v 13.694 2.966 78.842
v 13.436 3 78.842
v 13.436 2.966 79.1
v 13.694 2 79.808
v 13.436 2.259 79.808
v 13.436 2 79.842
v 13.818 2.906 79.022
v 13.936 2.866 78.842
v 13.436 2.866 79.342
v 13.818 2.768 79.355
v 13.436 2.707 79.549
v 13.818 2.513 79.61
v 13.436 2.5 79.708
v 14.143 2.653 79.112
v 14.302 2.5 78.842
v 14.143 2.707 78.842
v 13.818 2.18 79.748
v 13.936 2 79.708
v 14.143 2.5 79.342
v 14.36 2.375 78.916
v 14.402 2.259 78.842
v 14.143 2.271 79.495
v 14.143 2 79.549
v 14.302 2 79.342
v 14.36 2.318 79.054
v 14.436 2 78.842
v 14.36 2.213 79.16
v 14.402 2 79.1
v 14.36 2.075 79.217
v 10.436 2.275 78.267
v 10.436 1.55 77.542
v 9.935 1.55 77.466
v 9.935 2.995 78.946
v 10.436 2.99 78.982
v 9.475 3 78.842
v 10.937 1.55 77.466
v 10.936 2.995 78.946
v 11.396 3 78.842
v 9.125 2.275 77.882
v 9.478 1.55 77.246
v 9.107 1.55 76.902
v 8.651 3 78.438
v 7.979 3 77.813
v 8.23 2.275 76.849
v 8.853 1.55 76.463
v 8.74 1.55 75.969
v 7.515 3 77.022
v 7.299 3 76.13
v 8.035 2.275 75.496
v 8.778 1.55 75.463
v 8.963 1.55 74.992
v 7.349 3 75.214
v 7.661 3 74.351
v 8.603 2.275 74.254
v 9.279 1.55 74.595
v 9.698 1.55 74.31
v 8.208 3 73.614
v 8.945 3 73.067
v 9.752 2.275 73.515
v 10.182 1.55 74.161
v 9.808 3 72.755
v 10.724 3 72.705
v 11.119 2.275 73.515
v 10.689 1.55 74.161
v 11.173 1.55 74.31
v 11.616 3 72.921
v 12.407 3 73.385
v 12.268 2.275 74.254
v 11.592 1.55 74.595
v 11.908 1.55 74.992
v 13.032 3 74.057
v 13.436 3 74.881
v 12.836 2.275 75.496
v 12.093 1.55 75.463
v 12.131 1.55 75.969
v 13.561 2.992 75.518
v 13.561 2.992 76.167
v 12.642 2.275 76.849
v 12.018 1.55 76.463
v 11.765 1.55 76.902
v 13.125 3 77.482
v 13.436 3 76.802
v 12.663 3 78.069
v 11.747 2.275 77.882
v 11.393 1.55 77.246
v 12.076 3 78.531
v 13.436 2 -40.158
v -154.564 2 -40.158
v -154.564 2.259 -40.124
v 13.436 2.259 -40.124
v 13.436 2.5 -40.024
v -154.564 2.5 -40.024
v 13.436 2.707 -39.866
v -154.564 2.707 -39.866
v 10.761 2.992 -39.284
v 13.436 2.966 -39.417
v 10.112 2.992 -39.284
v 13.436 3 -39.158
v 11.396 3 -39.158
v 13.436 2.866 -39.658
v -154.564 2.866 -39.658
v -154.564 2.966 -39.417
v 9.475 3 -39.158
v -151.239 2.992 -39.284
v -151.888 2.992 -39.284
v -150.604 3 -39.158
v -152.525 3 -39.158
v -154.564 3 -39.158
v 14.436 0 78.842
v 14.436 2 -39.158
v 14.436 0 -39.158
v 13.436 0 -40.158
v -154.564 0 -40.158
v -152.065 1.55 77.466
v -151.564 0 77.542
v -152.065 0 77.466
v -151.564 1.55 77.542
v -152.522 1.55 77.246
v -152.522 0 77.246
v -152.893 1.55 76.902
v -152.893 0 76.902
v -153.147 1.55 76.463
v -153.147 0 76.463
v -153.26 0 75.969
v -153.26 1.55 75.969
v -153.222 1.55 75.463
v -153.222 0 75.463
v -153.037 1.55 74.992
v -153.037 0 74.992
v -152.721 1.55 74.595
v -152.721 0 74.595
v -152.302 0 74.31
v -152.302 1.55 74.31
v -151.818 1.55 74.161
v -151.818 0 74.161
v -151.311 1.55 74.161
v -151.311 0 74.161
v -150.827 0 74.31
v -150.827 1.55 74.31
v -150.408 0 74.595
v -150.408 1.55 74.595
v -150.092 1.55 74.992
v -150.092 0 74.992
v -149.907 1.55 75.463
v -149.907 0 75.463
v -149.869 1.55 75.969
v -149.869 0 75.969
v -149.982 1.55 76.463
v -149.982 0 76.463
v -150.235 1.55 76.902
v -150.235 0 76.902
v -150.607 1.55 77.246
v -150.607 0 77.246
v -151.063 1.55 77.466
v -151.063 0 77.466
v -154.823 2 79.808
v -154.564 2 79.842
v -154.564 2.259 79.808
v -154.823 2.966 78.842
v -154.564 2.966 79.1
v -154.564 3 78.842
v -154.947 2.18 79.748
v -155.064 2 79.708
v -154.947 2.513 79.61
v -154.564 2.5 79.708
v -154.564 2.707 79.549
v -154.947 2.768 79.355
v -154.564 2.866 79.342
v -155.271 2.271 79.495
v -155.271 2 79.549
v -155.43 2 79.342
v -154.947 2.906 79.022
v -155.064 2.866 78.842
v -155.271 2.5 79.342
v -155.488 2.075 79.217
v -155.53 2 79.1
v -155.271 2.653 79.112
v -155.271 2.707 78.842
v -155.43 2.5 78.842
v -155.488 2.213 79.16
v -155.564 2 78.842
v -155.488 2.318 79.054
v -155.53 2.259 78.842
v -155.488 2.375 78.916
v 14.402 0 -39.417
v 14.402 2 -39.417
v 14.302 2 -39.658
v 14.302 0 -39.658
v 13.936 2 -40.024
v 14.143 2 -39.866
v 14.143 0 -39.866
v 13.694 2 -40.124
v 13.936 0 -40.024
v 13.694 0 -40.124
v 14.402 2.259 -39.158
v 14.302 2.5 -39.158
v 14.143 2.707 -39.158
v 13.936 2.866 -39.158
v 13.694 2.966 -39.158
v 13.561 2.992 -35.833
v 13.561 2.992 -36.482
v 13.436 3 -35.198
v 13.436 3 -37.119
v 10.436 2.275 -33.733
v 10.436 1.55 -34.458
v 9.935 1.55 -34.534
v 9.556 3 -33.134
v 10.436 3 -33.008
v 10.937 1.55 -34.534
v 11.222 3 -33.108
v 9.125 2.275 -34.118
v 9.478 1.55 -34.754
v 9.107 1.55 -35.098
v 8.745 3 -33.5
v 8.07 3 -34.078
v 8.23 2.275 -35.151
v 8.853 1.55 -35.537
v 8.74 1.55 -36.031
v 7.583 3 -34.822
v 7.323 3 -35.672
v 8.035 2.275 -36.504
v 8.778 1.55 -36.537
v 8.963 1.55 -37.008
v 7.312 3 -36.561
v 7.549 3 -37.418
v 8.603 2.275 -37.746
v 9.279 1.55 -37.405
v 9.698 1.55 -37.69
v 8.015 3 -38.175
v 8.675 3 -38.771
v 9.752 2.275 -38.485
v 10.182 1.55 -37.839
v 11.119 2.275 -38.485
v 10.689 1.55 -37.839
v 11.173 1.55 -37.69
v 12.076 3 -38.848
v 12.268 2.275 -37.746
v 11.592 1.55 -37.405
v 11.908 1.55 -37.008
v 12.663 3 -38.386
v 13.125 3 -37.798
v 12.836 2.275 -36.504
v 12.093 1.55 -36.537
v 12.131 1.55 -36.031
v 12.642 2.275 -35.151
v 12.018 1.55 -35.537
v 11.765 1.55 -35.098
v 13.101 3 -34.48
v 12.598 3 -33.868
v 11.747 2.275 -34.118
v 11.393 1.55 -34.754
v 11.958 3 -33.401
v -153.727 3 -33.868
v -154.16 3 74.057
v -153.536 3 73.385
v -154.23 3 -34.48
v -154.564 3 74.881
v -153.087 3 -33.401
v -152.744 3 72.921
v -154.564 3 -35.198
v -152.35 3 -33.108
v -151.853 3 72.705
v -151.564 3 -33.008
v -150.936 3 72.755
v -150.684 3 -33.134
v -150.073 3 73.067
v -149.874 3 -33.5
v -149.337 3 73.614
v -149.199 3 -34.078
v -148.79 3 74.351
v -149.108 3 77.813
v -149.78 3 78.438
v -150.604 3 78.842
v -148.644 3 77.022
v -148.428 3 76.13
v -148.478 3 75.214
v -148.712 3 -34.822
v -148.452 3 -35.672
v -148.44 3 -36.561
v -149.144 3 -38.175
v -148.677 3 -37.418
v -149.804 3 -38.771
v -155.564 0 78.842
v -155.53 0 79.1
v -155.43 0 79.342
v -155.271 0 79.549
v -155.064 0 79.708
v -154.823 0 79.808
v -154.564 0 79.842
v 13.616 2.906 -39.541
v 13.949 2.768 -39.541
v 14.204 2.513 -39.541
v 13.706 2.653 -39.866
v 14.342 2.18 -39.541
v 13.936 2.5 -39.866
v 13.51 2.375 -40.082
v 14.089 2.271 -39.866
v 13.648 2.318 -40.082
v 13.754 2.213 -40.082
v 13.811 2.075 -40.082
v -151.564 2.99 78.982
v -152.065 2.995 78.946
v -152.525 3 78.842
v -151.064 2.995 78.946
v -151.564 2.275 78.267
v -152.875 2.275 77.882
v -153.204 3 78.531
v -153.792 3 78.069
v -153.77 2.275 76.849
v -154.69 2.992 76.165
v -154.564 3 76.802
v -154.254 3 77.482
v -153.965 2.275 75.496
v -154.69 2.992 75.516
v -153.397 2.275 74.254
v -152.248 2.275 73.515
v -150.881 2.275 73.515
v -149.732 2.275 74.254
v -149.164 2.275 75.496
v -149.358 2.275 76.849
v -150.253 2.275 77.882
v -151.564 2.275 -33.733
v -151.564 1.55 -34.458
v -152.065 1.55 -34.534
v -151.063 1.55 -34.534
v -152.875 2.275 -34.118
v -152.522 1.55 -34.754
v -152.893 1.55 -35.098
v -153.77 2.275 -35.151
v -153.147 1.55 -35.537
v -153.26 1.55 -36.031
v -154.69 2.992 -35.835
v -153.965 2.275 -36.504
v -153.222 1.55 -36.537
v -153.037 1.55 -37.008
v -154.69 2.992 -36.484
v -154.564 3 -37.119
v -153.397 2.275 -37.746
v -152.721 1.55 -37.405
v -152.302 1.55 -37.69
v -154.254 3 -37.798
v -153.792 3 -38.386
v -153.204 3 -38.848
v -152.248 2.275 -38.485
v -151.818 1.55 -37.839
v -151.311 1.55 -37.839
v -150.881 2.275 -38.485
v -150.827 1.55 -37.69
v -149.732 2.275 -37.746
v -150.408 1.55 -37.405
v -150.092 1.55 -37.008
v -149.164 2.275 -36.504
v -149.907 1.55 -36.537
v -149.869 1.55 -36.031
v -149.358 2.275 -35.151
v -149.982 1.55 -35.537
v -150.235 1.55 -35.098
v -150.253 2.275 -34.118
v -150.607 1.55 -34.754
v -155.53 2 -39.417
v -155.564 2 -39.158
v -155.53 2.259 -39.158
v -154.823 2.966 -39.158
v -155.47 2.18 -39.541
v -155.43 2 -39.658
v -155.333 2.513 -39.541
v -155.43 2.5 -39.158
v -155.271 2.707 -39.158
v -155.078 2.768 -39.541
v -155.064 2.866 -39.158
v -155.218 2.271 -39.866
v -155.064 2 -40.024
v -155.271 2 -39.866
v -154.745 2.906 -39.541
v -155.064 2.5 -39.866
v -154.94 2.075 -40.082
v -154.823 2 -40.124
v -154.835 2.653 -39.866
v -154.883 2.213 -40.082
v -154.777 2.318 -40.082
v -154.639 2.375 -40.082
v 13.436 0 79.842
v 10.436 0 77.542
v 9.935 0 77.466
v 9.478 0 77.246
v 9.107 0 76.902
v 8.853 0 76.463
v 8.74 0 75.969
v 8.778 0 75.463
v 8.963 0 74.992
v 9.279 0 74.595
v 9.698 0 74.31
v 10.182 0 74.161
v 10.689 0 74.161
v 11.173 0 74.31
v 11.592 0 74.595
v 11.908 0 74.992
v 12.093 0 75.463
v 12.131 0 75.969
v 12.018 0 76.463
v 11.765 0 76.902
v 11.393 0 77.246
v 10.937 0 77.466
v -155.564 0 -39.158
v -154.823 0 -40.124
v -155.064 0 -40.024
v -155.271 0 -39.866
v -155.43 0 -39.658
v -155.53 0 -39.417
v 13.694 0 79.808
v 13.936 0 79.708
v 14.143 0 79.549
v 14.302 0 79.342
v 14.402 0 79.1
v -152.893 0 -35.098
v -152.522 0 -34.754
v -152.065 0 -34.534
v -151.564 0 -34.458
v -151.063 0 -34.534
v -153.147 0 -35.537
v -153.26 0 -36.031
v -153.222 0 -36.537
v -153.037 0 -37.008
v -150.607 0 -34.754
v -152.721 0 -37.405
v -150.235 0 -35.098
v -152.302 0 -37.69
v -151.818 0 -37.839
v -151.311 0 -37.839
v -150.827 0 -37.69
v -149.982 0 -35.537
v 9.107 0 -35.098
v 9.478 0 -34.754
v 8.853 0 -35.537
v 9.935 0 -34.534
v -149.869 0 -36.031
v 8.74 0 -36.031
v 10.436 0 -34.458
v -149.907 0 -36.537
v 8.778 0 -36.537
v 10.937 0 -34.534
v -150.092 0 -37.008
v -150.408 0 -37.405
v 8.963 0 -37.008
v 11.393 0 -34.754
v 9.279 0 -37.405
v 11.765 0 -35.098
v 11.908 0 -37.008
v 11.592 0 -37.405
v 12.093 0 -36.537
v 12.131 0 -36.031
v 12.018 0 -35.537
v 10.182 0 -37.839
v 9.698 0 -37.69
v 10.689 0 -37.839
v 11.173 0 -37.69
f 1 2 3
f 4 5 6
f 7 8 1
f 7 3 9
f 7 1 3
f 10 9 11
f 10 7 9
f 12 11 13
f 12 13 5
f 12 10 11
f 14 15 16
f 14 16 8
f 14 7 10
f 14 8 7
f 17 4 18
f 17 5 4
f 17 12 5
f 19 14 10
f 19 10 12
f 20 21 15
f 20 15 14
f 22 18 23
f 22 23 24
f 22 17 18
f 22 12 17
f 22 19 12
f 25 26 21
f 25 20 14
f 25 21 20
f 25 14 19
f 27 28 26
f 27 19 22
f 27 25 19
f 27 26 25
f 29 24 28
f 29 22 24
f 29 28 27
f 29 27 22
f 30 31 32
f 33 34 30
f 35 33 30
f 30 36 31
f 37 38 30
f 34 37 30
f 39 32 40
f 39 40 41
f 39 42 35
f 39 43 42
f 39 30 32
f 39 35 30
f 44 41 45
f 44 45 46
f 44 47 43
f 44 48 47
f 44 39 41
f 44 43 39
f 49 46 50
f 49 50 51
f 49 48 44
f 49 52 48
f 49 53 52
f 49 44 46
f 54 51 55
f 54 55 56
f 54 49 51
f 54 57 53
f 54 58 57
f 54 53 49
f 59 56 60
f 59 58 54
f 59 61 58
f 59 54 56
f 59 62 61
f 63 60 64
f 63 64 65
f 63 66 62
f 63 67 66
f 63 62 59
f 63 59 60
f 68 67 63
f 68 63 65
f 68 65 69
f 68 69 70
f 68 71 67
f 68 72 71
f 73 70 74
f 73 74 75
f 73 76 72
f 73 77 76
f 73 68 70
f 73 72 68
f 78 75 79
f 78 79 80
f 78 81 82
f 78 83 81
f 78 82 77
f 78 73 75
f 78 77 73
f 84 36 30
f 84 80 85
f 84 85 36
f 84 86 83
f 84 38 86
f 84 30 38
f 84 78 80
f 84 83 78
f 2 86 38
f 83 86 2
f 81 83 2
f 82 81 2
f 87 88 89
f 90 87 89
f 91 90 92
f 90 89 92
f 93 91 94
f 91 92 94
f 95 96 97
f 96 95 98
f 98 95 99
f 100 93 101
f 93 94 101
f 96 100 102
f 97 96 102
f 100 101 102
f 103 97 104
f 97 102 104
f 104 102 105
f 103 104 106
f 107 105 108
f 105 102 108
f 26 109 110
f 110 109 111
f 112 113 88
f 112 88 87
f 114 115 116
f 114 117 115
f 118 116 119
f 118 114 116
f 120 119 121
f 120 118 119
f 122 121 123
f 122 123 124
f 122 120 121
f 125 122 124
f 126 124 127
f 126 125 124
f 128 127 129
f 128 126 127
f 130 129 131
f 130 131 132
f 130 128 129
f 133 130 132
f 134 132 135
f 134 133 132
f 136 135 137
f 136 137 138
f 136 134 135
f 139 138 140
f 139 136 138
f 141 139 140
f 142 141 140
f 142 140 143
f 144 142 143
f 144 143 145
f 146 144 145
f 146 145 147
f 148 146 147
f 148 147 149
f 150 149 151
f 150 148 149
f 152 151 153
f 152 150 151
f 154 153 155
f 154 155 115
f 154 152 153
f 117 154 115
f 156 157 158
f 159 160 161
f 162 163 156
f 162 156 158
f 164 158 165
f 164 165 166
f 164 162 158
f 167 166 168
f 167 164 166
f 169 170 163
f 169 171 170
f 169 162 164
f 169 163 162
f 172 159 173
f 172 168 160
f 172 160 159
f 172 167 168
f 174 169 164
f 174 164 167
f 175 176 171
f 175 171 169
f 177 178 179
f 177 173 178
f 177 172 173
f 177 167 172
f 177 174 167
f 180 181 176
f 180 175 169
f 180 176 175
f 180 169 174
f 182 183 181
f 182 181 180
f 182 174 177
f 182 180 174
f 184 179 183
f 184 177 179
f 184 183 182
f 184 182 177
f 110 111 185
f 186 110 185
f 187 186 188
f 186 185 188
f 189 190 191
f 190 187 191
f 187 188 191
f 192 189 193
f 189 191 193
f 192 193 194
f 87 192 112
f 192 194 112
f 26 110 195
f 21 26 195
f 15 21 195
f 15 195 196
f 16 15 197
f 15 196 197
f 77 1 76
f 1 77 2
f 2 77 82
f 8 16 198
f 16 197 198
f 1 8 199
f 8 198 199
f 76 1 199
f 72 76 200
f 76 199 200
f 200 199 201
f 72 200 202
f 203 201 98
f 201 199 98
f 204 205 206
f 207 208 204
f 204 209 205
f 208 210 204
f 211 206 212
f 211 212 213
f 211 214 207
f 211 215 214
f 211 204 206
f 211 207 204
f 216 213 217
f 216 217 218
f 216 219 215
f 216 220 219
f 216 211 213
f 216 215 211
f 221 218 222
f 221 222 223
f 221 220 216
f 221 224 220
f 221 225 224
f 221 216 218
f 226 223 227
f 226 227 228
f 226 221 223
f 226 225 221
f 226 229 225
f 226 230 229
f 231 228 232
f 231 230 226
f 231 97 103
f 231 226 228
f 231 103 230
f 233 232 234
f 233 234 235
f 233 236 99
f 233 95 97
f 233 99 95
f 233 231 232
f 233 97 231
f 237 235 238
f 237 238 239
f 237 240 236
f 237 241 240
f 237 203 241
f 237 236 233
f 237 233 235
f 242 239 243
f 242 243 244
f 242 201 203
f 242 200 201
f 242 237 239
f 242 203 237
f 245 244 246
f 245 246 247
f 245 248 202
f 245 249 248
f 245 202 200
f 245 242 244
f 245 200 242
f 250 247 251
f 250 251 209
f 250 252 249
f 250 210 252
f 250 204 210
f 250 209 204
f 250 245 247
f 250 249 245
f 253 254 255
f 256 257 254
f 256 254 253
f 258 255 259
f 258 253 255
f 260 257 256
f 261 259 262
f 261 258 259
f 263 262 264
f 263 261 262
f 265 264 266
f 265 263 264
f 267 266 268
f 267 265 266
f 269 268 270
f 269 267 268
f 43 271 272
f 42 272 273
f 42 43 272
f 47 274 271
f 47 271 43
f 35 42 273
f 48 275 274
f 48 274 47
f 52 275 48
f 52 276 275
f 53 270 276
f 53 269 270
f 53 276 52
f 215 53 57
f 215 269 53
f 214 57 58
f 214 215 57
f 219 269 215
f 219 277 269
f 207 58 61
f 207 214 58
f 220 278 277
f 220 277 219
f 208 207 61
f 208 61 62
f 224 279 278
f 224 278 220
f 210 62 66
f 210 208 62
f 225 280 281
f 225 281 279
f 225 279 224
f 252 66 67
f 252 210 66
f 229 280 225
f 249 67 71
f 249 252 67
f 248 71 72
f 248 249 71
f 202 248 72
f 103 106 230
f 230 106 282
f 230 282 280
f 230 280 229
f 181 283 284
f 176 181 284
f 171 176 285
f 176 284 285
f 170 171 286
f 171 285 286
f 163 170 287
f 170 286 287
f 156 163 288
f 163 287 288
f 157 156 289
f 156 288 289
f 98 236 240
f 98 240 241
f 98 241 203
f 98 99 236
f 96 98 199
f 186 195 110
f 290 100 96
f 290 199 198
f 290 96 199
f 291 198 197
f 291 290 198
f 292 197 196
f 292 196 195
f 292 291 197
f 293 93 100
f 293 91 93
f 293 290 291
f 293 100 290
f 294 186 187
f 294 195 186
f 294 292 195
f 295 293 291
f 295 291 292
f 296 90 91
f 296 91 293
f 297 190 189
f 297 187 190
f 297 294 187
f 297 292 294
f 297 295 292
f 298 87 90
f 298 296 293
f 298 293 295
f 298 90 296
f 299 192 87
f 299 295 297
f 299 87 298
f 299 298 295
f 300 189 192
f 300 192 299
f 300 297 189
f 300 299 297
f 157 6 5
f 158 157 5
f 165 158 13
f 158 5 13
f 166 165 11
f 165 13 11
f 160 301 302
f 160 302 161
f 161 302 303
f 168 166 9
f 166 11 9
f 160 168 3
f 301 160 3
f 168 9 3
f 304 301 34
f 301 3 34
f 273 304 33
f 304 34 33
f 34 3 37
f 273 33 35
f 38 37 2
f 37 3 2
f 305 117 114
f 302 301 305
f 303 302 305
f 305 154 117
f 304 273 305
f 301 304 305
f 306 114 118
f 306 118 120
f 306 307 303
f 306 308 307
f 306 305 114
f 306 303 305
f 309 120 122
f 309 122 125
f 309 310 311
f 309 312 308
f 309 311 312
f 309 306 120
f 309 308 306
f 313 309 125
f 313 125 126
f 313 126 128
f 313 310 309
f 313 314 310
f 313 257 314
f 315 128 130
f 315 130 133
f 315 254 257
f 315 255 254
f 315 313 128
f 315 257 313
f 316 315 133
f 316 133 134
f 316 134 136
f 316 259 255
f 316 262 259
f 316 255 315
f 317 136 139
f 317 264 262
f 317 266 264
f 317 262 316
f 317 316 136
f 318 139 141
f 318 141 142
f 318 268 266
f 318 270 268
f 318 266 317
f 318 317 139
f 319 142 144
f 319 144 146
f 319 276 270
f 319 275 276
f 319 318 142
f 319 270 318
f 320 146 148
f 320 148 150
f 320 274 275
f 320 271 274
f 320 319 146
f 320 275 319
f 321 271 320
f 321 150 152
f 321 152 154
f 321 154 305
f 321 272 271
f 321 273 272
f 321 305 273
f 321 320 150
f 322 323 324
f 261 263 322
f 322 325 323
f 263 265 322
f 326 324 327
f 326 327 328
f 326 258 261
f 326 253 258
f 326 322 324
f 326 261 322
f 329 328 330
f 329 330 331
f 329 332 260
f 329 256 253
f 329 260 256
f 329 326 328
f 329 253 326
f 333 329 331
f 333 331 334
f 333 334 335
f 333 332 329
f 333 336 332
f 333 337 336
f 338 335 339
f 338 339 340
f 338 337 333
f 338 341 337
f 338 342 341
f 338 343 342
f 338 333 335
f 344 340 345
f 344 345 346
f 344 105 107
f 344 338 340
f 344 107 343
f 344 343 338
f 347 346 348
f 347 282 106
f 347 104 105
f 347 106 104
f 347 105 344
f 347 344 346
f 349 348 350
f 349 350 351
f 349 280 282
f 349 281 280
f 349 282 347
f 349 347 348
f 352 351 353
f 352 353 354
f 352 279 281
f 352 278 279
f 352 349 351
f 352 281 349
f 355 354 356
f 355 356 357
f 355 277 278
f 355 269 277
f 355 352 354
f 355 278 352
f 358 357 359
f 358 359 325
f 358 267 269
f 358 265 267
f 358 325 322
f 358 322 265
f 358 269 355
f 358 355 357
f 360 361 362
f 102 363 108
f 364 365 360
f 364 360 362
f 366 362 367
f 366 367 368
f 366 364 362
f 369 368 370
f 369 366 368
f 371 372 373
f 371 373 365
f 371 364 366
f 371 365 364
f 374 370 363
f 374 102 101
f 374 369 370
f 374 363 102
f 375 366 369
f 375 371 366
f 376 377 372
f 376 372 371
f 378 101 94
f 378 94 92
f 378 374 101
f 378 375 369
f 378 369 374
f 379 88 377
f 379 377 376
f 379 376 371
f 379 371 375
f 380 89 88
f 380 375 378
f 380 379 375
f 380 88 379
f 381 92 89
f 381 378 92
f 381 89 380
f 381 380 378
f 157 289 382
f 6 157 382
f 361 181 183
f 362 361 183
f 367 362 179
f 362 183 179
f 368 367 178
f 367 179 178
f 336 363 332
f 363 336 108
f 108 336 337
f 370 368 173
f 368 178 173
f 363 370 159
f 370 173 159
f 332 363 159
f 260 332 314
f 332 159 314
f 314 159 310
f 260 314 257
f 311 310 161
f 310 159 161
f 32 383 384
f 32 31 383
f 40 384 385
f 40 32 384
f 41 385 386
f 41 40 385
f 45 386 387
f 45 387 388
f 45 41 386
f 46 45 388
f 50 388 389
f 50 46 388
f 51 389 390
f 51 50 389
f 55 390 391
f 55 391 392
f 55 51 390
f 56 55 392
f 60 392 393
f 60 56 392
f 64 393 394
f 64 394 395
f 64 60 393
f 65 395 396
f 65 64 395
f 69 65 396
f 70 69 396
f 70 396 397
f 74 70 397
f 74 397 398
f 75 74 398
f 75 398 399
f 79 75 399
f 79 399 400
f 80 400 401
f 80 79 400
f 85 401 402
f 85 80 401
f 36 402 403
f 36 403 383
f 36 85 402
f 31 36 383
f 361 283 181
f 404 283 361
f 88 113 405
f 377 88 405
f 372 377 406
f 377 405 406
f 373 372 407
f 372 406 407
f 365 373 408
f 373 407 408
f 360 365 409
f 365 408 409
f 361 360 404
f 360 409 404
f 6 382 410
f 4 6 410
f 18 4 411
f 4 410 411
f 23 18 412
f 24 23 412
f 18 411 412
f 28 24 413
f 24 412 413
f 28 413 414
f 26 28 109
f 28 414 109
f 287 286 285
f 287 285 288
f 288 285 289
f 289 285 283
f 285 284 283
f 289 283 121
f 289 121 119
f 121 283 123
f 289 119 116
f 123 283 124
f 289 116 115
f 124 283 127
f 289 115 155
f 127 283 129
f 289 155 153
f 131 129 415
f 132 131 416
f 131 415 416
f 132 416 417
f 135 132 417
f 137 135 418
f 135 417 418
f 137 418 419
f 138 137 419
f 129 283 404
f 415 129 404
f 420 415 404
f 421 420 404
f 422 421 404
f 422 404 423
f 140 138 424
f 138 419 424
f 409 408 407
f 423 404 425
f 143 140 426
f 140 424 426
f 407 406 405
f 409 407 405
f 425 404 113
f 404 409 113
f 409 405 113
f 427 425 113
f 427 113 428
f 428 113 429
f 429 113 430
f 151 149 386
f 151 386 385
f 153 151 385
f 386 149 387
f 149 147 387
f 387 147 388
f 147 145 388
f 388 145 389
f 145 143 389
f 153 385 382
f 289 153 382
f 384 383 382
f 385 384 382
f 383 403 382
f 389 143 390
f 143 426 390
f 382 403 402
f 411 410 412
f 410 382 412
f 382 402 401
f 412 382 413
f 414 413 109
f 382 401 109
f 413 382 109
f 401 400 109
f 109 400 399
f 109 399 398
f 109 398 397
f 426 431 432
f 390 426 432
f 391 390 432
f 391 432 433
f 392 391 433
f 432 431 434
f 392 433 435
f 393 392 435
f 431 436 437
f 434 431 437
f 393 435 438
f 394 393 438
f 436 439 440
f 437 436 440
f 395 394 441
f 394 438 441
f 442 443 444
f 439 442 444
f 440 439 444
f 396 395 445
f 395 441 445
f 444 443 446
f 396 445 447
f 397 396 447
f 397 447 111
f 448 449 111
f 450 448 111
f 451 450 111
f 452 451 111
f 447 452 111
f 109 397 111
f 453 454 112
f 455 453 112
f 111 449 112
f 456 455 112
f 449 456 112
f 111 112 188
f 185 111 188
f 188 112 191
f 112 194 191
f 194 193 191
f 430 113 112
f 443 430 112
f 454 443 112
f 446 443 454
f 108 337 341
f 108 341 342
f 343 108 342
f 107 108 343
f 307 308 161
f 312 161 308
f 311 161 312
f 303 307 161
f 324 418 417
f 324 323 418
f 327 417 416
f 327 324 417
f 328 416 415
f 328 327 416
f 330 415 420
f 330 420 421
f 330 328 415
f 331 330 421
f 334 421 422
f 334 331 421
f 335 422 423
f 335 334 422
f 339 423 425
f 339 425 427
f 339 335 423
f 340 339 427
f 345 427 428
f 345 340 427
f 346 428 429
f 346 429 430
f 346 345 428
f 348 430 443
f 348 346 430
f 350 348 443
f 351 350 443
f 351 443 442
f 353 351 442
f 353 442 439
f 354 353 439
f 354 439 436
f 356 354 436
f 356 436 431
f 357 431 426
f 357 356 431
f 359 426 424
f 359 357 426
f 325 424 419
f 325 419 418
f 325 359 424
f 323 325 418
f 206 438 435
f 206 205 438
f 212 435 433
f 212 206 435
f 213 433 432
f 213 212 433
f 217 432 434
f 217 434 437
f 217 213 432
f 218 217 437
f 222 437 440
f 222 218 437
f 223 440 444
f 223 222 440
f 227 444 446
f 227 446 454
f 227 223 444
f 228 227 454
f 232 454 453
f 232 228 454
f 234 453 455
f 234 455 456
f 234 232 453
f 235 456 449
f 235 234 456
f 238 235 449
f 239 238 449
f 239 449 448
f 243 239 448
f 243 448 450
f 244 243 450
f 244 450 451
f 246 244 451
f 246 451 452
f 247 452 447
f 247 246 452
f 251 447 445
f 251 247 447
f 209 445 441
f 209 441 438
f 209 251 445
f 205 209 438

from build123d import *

# Parameters (mm, degrees)
SKETCH1_W                                      = 170
SKETCH1_H                                      = 120
BOSS_EXTRUDE1_DEPTH                            = 3
CSK_FOR_M3_FLAT_HEAD_MACHINE_SCREW1_AT_2_COUNT = 2
CSK_FOR_M3_FLAT_HEAD_MACHINE_SCREW1_AT_2_PITCH = 162
CSK_FOR_M3_FLAT_HEAD_MACHINE_SCREW1_AT_3_COUNT = 2
CSK_FOR_M3_FLAT_HEAD_MACHINE_SCREW1_AT_3_PITCH = 196.946693295
CSK_FOR_M3_FLAT_HEAD_MACHINE_SCREW1_AT_4_COUNT = 2
CSK_FOR_M3_FLAT_HEAD_MACHINE_SCREW1_AT_4_PITCH = 112
FILLET2_R                                      = 1


with BuildPart() as part:
    # Sketch1 → Boss-Extrude1 (new body)
    with BuildSketch(Plane(origin=(0, 0, 0), x_dir=(1, 0, 0), z_dir=(0, 1, 0))):
        with Locations((-70.564356436, -19.841584158)):
            Rectangle(SKETCH1_W, SKETCH1_H)
    extrude(amount=BOSS_EXTRUDE1_DEPTH)

    # Sketch4 → CSK for M3 Flat Head Machine Screw1 (revolve, cut)
    with BuildSketch(Plane(origin=(-151.564356436, 3, -36.158415842), x_dir=(0, 0, 1), z_dir=(1, 0, 0))):
        Polygon((0, 0), (0, 3), (1.7, 3), (1.7, 1.45), (3.15, 0), align=None)
    csk_for_m3_flat_head_machine_screw1 = revolve(axis=Axis((-151.564356436, 9.35, -36.158415842), (0, -1, 0)), mode=Mode.SUBTRACT)

    # CSK for M3 Flat Head Machine Screw1 at 2: CSK for M3 Flat Head Machine Screw1 ×2
    with Locations(*[(i * CSK_FOR_M3_FLAT_HEAD_MACHINE_SCREW1_AT_2_PITCH, 0, 0) for i in range(1, CSK_FOR_M3_FLAT_HEAD_MACHINE_SCREW1_AT_2_COUNT)]):
        add(csk_for_m3_flat_head_machine_screw1, mode=Mode.SUBTRACT)

    # CSK for M3 Flat Head Machine Screw1 at 3: CSK for M3 Flat Head Machine Screw1 ×2
    with Locations(*[Vector(0.8225576032241401, 0, 0.5686817997598994) * (i * CSK_FOR_M3_FLAT_HEAD_MACHINE_SCREW1_AT_3_PITCH) for i in range(1, CSK_FOR_M3_FLAT_HEAD_MACHINE_SCREW1_AT_3_COUNT)]):
        add(csk_for_m3_flat_head_machine_screw1, mode=Mode.SUBTRACT)

    # CSK for M3 Flat Head Machine Screw1 at 4: CSK for M3 Flat Head Machine Screw1 ×2
    with Locations(*[(0, 0, i * CSK_FOR_M3_FLAT_HEAD_MACHINE_SCREW1_AT_4_PITCH) for i in range(1, CSK_FOR_M3_FLAT_HEAD_MACHINE_SCREW1_AT_4_COUNT)]):
        add(csk_for_m3_flat_head_machine_screw1, mode=Mode.SUBTRACT)

    # Fillet2
    # the kernel refuses this fillet: 1 mm, written as the material it takes off along each edge
    with BuildSketch(Plane(origin=(13.435643564, 2, -39.158415842), x_dir=(1, 0, 0), z_dir=(0, 0, -1))) as fillet2_piece_1_section:
        Polygon((0, 0), (FILLET2_R, 0), (FILLET2_R, -FILLET2_R), (0, -FILLET2_R), align=None)
    fillet2_piece_1 = extrude(amount=FILLET2_R, mode=Mode.PRIVATE)
    fillet2_piece_1 = fillet2_piece_1 - Plane(origin=(13.435643564, 2, -39.158415842), x_dir=(-0.7071067811865475, -0.7071067811865475, 0), z_dir=(0, 0, -1)) * Sphere(FILLET2_R, mode=Mode.PRIVATE)
    add(fillet2_piece_1, mode=Mode.SUBTRACT)
    with BuildSketch(Plane(origin=(13.435643564, 2, 78.841584158), x_dir=(0, 1, 0), z_dir=(1, 0, 0))) as fillet2_piece_2_section:
        Polygon((0, 0), (FILLET2_R, 0), (FILLET2_R, FILLET2_R), (0, FILLET2_R), align=None)
    fillet2_piece_2 = extrude(amount=FILLET2_R, mode=Mode.PRIVATE)
    fillet2_piece_2 = fillet2_piece_2 - Plane(origin=(13.435643564, 2, 78.841584158), x_dir=(0, -0.7071067811865475, -0.7071067811865475), z_dir=(1, 0, 0)) * Sphere(FILLET2_R, mode=Mode.PRIVATE)
    add(fillet2_piece_2, mode=Mode.SUBTRACT)
    with BuildSketch(Plane(origin=(-154.564356436, 2, -39.158415842), x_dir=(-1, 0, 0), z_dir=(0, 0, -1))) as fillet2_piece_3_section:
        Polygon((0, 0), (FILLET2_R, 0), (FILLET2_R, FILLET2_R), (0, FILLET2_R), align=None)
    fillet2_piece_3 = extrude(amount=FILLET2_R, mode=Mode.PRIVATE)
    fillet2_piece_3 = fillet2_piece_3 - Plane(origin=(-154.564356436, 2, -39.158415842), x_dir=(0.7071067811865475, -0.7071067811865475, 0), z_dir=(0, 0, -1)) * Sphere(FILLET2_R, mode=Mode.PRIVATE)
    add(fillet2_piece_3, mode=Mode.SUBTRACT)
    with BuildSketch(Plane(origin=(-154.564356436, 2, 78.841584158), x_dir=(0, 1, 0), z_dir=(-1, 0, 0))) as fillet2_piece_4_section:
        Polygon((0, 0), (FILLET2_R, 0), (FILLET2_R, -FILLET2_R), (0, -FILLET2_R), align=None)
    fillet2_piece_4 = extrude(amount=FILLET2_R, mode=Mode.PRIVATE)
    fillet2_piece_4 = fillet2_piece_4 - Plane(origin=(-154.564356436, 2, 78.841584158), x_dir=(0, -0.7071067811865475, -0.7071067811865475), z_dir=(-1, 0, 0)) * Sphere(FILLET2_R, mode=Mode.PRIVATE)
    add(fillet2_piece_4, mode=Mode.SUBTRACT)
    with BuildSketch(Plane(origin=(14.435643564, 3, -39.158415842), x_dir=(0, -1, 0), z_dir=(0, 0, 1)), Plane(origin=(-155.564356436, 3, 78.841584158), x_dir=(0, -1, 0), z_dir=(0, 0, -1))) as fillet2_piece_5:
        with BuildLine():
            CenterArc((FILLET2_R, -FILLET2_R), FILLET2_R, 90, 90)
            Line((0, -FILLET2_R), (0, 0))
            Line((0, 0), (FILLET2_R, 0))
        make_face()
    extrude(amount=118, mode=Mode.SUBTRACT)
    with BuildSketch(Plane(origin=(-154.564356436, 3, -40.158415842), x_dir=(0, -1, 0), z_dir=(1, 0, 0))) as fillet2_piece_6:
        with BuildLine():
            CenterArc((FILLET2_R, -FILLET2_R), FILLET2_R, 90, 90)
            Line((0, -FILLET2_R), (0, 0))
            Line((0, 0), (FILLET2_R, 0))
        make_face()
    extrude(amount=168, mode=Mode.SUBTRACT)
    with BuildSketch(Plane(origin=(-155.564356436, -2.5, -40.158415842), x_dir=(1, 0, 0), z_dir=(0, 1, 0)), Plane(origin=(-155.564356436, -2.5, 79.841584158), x_dir=(0, 0, -1), z_dir=(0, 1, 0))) as fillet2_piece_7:
        with BuildLine():
            CenterArc((FILLET2_R, -FILLET2_R), FILLET2_R, 90, 90)
            Line((0, -FILLET2_R), (0, 0))
            Line((0, 0), (FILLET2_R, 0))
        make_face()
    extrude(amount=4.5, mode=Mode.SUBTRACT)
    with BuildSketch(Plane(origin=(14.435643564, -2.5, -40.158415842), x_dir=(-1, 0, 0), z_dir=(0, 1, 0)), Plane(origin=(14.435643564, -2.5, 79.841584158), x_dir=(0, 0, -1), z_dir=(0, 1, 0))) as fillet2_piece_8:
        with BuildLine():
            CenterArc((FILLET2_R, FILLET2_R), FILLET2_R, 180, 90)
            Line((0, FILLET2_R), (0, 0))
            Line((0, 0), (FILLET2_R, 0))
        make_face()
    extrude(amount=4.5, mode=Mode.SUBTRACT)
    with BuildSketch(Plane(origin=(13.435643564, 3, 79.841584158), x_dir=(0, 0, -1), z_dir=(-1, 0, 0))) as fillet2_piece_9:
        with BuildLine():
            CenterArc((FILLET2_R, FILLET2_R), FILLET2_R, 180, 90)
            Line((0, FILLET2_R), (0, 0))
            Line((0, 0), (FILLET2_R, 0))
        make_face()
    extrude(amount=168, mode=Mode.SUBTRACT)


solid = part.part
